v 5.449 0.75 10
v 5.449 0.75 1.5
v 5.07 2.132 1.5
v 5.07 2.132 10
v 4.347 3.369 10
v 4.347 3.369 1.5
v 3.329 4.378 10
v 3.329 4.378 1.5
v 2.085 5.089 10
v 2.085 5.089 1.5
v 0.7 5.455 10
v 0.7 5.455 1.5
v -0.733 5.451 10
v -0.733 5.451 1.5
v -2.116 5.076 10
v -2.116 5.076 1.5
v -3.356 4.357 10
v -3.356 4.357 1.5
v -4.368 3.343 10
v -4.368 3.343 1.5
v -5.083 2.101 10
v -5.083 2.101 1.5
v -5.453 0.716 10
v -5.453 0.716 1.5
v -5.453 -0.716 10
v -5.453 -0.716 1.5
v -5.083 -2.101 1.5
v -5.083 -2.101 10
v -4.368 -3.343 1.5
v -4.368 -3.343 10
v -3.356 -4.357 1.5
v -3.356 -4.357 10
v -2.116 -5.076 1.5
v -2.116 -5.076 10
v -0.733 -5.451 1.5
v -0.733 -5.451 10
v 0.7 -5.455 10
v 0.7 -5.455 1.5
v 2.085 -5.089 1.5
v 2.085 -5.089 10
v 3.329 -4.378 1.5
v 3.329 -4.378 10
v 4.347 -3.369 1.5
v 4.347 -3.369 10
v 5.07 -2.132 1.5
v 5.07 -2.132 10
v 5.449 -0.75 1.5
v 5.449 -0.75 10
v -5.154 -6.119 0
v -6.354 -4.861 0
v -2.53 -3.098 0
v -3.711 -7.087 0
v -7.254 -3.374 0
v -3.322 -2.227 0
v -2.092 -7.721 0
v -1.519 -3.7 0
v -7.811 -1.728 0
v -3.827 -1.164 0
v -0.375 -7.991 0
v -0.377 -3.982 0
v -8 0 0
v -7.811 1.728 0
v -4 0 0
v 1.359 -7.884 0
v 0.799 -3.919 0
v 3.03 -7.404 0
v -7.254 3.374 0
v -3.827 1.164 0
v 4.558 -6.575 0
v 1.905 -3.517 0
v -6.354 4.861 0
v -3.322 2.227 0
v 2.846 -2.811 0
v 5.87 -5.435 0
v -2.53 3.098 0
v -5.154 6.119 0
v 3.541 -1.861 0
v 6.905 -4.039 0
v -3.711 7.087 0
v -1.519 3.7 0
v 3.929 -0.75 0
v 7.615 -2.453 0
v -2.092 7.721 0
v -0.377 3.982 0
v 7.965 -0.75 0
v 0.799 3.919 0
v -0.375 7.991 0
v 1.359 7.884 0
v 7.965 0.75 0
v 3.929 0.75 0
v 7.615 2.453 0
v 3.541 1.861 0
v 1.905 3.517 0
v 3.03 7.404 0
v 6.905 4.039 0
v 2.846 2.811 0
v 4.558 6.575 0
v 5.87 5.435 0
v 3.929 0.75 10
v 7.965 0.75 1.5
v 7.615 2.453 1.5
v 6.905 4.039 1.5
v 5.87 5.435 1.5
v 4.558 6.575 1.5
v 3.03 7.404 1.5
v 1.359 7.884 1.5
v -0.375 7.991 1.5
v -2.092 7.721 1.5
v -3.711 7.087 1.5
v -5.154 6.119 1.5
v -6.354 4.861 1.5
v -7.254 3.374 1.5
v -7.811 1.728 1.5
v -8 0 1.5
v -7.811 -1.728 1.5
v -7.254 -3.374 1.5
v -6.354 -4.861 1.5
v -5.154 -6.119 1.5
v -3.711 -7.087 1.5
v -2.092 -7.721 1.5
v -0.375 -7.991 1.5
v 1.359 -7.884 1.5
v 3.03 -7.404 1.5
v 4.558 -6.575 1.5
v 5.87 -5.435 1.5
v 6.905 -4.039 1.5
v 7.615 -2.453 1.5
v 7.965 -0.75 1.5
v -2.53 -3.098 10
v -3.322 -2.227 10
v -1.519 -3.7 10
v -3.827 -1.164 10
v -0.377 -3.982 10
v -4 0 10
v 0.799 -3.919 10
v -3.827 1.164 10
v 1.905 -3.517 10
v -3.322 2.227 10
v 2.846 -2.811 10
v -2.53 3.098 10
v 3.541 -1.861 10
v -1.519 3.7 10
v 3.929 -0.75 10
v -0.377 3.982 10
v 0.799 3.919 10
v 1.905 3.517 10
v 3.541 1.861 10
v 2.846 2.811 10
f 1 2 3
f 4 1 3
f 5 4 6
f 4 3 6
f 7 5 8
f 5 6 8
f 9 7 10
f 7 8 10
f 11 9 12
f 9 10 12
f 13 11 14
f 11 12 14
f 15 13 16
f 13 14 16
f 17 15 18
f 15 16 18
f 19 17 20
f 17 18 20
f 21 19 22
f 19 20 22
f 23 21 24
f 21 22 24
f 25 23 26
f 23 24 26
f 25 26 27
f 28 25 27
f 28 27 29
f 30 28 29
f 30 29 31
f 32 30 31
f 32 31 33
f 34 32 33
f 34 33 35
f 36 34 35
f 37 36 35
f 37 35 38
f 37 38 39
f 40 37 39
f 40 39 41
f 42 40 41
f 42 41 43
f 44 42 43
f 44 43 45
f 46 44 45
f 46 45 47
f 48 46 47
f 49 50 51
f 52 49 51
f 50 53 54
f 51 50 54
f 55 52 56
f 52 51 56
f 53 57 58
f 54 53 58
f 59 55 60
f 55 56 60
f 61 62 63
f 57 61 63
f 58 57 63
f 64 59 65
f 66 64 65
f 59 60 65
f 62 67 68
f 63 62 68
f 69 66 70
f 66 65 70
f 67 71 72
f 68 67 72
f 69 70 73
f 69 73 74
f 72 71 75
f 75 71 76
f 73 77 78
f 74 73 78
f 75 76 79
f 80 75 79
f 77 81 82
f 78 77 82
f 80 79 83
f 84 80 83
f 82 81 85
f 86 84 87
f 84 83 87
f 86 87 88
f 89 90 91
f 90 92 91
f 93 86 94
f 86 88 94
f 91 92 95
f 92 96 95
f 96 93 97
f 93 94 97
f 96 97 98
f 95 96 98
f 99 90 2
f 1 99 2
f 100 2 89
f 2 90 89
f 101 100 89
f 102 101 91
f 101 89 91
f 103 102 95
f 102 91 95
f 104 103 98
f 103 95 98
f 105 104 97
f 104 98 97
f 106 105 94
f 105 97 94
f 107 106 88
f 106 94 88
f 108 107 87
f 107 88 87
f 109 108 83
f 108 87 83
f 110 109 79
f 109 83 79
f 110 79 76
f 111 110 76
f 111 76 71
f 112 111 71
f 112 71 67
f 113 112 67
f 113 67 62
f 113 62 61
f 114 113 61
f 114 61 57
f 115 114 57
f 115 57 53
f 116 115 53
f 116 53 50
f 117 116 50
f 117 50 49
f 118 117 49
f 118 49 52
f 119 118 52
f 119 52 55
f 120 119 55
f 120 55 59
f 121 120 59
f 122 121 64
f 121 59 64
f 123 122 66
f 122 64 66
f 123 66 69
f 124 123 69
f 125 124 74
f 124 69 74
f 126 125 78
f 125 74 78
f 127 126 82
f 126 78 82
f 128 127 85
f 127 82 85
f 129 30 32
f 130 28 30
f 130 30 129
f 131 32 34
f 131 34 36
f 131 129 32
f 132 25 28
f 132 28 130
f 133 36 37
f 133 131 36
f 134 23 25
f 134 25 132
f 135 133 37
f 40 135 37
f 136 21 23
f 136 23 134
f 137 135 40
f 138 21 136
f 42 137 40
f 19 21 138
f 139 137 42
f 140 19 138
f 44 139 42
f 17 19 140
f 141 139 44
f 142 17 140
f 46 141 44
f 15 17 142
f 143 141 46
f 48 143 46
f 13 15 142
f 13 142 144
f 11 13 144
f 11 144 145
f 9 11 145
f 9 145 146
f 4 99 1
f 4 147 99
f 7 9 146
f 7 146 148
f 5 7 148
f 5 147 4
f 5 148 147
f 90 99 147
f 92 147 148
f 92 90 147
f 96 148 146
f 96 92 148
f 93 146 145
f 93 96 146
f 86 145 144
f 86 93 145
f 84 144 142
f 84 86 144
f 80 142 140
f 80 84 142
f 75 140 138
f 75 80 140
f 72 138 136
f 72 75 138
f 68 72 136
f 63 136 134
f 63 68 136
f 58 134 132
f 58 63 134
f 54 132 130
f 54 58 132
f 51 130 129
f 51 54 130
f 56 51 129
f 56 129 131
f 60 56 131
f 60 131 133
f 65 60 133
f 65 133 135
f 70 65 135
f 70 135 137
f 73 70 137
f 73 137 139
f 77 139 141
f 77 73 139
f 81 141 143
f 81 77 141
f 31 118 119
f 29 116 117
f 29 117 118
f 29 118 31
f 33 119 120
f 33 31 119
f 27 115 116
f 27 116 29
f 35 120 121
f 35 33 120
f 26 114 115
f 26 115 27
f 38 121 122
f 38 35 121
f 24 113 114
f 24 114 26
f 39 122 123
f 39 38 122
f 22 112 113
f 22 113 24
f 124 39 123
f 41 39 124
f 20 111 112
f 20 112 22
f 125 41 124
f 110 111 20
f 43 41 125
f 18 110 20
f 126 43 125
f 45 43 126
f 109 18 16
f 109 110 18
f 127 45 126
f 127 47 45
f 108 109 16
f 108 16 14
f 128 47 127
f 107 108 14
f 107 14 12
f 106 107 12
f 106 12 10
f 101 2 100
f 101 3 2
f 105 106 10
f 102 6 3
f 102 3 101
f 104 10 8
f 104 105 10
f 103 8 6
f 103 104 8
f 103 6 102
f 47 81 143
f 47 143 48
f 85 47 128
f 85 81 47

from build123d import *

# Parameters (mm, degrees)
BOX_W             = 11
BOX_H             = 1.5
BOX_DEPTH         = 15
CYLINDER002_R     = 4
CYLINDER002_DEPTH = 15
CYLINDER001_R     = 8
CYLINDER001_DEPTH = 1.5
CYLINDER_R        = 5.5
CYLINDER_DEPTH    = 10


with BuildPart() as cube:
    # Box → Box (new body)
    with BuildSketch(Plane(origin=(0, -0.75, 0), x_dir=(1, 0, 0), z_dir=(0, 0, 1))):
        with Locations((5.5, 0.75)):
            Rectangle(BOX_W, BOX_H)
    extrude(amount=BOX_DEPTH)


with BuildPart() as hole:
    # Cylinder002 → Cylinder002 (new body)
    with BuildSketch(Plane.XY):
        Circle(CYLINDER002_R)
    extrude(amount=CYLINDER002_DEPTH)


with BuildPart() as base:
    # Cylinder001 → Cylinder001 (new body)
    with BuildSketch(Plane.XY):
        Circle(CYLINDER001_R)
    extrude(amount=CYLINDER001_DEPTH)


with BuildPart() as cut001:
    # Cylinder → Cylinder (new body)
    with BuildSketch(Plane.XY):
        Circle(CYLINDER_R)
    extrude(amount=CYLINDER_DEPTH)

    # Fusion: union base
    add(base.part)

    # Cut: cut hole
    add(hole.part, mode=Mode.SUBTRACT)

    # Cut001: cut Cube
    add(cube.part, mode=Mode.SUBTRACT)


solid = cut001.part
